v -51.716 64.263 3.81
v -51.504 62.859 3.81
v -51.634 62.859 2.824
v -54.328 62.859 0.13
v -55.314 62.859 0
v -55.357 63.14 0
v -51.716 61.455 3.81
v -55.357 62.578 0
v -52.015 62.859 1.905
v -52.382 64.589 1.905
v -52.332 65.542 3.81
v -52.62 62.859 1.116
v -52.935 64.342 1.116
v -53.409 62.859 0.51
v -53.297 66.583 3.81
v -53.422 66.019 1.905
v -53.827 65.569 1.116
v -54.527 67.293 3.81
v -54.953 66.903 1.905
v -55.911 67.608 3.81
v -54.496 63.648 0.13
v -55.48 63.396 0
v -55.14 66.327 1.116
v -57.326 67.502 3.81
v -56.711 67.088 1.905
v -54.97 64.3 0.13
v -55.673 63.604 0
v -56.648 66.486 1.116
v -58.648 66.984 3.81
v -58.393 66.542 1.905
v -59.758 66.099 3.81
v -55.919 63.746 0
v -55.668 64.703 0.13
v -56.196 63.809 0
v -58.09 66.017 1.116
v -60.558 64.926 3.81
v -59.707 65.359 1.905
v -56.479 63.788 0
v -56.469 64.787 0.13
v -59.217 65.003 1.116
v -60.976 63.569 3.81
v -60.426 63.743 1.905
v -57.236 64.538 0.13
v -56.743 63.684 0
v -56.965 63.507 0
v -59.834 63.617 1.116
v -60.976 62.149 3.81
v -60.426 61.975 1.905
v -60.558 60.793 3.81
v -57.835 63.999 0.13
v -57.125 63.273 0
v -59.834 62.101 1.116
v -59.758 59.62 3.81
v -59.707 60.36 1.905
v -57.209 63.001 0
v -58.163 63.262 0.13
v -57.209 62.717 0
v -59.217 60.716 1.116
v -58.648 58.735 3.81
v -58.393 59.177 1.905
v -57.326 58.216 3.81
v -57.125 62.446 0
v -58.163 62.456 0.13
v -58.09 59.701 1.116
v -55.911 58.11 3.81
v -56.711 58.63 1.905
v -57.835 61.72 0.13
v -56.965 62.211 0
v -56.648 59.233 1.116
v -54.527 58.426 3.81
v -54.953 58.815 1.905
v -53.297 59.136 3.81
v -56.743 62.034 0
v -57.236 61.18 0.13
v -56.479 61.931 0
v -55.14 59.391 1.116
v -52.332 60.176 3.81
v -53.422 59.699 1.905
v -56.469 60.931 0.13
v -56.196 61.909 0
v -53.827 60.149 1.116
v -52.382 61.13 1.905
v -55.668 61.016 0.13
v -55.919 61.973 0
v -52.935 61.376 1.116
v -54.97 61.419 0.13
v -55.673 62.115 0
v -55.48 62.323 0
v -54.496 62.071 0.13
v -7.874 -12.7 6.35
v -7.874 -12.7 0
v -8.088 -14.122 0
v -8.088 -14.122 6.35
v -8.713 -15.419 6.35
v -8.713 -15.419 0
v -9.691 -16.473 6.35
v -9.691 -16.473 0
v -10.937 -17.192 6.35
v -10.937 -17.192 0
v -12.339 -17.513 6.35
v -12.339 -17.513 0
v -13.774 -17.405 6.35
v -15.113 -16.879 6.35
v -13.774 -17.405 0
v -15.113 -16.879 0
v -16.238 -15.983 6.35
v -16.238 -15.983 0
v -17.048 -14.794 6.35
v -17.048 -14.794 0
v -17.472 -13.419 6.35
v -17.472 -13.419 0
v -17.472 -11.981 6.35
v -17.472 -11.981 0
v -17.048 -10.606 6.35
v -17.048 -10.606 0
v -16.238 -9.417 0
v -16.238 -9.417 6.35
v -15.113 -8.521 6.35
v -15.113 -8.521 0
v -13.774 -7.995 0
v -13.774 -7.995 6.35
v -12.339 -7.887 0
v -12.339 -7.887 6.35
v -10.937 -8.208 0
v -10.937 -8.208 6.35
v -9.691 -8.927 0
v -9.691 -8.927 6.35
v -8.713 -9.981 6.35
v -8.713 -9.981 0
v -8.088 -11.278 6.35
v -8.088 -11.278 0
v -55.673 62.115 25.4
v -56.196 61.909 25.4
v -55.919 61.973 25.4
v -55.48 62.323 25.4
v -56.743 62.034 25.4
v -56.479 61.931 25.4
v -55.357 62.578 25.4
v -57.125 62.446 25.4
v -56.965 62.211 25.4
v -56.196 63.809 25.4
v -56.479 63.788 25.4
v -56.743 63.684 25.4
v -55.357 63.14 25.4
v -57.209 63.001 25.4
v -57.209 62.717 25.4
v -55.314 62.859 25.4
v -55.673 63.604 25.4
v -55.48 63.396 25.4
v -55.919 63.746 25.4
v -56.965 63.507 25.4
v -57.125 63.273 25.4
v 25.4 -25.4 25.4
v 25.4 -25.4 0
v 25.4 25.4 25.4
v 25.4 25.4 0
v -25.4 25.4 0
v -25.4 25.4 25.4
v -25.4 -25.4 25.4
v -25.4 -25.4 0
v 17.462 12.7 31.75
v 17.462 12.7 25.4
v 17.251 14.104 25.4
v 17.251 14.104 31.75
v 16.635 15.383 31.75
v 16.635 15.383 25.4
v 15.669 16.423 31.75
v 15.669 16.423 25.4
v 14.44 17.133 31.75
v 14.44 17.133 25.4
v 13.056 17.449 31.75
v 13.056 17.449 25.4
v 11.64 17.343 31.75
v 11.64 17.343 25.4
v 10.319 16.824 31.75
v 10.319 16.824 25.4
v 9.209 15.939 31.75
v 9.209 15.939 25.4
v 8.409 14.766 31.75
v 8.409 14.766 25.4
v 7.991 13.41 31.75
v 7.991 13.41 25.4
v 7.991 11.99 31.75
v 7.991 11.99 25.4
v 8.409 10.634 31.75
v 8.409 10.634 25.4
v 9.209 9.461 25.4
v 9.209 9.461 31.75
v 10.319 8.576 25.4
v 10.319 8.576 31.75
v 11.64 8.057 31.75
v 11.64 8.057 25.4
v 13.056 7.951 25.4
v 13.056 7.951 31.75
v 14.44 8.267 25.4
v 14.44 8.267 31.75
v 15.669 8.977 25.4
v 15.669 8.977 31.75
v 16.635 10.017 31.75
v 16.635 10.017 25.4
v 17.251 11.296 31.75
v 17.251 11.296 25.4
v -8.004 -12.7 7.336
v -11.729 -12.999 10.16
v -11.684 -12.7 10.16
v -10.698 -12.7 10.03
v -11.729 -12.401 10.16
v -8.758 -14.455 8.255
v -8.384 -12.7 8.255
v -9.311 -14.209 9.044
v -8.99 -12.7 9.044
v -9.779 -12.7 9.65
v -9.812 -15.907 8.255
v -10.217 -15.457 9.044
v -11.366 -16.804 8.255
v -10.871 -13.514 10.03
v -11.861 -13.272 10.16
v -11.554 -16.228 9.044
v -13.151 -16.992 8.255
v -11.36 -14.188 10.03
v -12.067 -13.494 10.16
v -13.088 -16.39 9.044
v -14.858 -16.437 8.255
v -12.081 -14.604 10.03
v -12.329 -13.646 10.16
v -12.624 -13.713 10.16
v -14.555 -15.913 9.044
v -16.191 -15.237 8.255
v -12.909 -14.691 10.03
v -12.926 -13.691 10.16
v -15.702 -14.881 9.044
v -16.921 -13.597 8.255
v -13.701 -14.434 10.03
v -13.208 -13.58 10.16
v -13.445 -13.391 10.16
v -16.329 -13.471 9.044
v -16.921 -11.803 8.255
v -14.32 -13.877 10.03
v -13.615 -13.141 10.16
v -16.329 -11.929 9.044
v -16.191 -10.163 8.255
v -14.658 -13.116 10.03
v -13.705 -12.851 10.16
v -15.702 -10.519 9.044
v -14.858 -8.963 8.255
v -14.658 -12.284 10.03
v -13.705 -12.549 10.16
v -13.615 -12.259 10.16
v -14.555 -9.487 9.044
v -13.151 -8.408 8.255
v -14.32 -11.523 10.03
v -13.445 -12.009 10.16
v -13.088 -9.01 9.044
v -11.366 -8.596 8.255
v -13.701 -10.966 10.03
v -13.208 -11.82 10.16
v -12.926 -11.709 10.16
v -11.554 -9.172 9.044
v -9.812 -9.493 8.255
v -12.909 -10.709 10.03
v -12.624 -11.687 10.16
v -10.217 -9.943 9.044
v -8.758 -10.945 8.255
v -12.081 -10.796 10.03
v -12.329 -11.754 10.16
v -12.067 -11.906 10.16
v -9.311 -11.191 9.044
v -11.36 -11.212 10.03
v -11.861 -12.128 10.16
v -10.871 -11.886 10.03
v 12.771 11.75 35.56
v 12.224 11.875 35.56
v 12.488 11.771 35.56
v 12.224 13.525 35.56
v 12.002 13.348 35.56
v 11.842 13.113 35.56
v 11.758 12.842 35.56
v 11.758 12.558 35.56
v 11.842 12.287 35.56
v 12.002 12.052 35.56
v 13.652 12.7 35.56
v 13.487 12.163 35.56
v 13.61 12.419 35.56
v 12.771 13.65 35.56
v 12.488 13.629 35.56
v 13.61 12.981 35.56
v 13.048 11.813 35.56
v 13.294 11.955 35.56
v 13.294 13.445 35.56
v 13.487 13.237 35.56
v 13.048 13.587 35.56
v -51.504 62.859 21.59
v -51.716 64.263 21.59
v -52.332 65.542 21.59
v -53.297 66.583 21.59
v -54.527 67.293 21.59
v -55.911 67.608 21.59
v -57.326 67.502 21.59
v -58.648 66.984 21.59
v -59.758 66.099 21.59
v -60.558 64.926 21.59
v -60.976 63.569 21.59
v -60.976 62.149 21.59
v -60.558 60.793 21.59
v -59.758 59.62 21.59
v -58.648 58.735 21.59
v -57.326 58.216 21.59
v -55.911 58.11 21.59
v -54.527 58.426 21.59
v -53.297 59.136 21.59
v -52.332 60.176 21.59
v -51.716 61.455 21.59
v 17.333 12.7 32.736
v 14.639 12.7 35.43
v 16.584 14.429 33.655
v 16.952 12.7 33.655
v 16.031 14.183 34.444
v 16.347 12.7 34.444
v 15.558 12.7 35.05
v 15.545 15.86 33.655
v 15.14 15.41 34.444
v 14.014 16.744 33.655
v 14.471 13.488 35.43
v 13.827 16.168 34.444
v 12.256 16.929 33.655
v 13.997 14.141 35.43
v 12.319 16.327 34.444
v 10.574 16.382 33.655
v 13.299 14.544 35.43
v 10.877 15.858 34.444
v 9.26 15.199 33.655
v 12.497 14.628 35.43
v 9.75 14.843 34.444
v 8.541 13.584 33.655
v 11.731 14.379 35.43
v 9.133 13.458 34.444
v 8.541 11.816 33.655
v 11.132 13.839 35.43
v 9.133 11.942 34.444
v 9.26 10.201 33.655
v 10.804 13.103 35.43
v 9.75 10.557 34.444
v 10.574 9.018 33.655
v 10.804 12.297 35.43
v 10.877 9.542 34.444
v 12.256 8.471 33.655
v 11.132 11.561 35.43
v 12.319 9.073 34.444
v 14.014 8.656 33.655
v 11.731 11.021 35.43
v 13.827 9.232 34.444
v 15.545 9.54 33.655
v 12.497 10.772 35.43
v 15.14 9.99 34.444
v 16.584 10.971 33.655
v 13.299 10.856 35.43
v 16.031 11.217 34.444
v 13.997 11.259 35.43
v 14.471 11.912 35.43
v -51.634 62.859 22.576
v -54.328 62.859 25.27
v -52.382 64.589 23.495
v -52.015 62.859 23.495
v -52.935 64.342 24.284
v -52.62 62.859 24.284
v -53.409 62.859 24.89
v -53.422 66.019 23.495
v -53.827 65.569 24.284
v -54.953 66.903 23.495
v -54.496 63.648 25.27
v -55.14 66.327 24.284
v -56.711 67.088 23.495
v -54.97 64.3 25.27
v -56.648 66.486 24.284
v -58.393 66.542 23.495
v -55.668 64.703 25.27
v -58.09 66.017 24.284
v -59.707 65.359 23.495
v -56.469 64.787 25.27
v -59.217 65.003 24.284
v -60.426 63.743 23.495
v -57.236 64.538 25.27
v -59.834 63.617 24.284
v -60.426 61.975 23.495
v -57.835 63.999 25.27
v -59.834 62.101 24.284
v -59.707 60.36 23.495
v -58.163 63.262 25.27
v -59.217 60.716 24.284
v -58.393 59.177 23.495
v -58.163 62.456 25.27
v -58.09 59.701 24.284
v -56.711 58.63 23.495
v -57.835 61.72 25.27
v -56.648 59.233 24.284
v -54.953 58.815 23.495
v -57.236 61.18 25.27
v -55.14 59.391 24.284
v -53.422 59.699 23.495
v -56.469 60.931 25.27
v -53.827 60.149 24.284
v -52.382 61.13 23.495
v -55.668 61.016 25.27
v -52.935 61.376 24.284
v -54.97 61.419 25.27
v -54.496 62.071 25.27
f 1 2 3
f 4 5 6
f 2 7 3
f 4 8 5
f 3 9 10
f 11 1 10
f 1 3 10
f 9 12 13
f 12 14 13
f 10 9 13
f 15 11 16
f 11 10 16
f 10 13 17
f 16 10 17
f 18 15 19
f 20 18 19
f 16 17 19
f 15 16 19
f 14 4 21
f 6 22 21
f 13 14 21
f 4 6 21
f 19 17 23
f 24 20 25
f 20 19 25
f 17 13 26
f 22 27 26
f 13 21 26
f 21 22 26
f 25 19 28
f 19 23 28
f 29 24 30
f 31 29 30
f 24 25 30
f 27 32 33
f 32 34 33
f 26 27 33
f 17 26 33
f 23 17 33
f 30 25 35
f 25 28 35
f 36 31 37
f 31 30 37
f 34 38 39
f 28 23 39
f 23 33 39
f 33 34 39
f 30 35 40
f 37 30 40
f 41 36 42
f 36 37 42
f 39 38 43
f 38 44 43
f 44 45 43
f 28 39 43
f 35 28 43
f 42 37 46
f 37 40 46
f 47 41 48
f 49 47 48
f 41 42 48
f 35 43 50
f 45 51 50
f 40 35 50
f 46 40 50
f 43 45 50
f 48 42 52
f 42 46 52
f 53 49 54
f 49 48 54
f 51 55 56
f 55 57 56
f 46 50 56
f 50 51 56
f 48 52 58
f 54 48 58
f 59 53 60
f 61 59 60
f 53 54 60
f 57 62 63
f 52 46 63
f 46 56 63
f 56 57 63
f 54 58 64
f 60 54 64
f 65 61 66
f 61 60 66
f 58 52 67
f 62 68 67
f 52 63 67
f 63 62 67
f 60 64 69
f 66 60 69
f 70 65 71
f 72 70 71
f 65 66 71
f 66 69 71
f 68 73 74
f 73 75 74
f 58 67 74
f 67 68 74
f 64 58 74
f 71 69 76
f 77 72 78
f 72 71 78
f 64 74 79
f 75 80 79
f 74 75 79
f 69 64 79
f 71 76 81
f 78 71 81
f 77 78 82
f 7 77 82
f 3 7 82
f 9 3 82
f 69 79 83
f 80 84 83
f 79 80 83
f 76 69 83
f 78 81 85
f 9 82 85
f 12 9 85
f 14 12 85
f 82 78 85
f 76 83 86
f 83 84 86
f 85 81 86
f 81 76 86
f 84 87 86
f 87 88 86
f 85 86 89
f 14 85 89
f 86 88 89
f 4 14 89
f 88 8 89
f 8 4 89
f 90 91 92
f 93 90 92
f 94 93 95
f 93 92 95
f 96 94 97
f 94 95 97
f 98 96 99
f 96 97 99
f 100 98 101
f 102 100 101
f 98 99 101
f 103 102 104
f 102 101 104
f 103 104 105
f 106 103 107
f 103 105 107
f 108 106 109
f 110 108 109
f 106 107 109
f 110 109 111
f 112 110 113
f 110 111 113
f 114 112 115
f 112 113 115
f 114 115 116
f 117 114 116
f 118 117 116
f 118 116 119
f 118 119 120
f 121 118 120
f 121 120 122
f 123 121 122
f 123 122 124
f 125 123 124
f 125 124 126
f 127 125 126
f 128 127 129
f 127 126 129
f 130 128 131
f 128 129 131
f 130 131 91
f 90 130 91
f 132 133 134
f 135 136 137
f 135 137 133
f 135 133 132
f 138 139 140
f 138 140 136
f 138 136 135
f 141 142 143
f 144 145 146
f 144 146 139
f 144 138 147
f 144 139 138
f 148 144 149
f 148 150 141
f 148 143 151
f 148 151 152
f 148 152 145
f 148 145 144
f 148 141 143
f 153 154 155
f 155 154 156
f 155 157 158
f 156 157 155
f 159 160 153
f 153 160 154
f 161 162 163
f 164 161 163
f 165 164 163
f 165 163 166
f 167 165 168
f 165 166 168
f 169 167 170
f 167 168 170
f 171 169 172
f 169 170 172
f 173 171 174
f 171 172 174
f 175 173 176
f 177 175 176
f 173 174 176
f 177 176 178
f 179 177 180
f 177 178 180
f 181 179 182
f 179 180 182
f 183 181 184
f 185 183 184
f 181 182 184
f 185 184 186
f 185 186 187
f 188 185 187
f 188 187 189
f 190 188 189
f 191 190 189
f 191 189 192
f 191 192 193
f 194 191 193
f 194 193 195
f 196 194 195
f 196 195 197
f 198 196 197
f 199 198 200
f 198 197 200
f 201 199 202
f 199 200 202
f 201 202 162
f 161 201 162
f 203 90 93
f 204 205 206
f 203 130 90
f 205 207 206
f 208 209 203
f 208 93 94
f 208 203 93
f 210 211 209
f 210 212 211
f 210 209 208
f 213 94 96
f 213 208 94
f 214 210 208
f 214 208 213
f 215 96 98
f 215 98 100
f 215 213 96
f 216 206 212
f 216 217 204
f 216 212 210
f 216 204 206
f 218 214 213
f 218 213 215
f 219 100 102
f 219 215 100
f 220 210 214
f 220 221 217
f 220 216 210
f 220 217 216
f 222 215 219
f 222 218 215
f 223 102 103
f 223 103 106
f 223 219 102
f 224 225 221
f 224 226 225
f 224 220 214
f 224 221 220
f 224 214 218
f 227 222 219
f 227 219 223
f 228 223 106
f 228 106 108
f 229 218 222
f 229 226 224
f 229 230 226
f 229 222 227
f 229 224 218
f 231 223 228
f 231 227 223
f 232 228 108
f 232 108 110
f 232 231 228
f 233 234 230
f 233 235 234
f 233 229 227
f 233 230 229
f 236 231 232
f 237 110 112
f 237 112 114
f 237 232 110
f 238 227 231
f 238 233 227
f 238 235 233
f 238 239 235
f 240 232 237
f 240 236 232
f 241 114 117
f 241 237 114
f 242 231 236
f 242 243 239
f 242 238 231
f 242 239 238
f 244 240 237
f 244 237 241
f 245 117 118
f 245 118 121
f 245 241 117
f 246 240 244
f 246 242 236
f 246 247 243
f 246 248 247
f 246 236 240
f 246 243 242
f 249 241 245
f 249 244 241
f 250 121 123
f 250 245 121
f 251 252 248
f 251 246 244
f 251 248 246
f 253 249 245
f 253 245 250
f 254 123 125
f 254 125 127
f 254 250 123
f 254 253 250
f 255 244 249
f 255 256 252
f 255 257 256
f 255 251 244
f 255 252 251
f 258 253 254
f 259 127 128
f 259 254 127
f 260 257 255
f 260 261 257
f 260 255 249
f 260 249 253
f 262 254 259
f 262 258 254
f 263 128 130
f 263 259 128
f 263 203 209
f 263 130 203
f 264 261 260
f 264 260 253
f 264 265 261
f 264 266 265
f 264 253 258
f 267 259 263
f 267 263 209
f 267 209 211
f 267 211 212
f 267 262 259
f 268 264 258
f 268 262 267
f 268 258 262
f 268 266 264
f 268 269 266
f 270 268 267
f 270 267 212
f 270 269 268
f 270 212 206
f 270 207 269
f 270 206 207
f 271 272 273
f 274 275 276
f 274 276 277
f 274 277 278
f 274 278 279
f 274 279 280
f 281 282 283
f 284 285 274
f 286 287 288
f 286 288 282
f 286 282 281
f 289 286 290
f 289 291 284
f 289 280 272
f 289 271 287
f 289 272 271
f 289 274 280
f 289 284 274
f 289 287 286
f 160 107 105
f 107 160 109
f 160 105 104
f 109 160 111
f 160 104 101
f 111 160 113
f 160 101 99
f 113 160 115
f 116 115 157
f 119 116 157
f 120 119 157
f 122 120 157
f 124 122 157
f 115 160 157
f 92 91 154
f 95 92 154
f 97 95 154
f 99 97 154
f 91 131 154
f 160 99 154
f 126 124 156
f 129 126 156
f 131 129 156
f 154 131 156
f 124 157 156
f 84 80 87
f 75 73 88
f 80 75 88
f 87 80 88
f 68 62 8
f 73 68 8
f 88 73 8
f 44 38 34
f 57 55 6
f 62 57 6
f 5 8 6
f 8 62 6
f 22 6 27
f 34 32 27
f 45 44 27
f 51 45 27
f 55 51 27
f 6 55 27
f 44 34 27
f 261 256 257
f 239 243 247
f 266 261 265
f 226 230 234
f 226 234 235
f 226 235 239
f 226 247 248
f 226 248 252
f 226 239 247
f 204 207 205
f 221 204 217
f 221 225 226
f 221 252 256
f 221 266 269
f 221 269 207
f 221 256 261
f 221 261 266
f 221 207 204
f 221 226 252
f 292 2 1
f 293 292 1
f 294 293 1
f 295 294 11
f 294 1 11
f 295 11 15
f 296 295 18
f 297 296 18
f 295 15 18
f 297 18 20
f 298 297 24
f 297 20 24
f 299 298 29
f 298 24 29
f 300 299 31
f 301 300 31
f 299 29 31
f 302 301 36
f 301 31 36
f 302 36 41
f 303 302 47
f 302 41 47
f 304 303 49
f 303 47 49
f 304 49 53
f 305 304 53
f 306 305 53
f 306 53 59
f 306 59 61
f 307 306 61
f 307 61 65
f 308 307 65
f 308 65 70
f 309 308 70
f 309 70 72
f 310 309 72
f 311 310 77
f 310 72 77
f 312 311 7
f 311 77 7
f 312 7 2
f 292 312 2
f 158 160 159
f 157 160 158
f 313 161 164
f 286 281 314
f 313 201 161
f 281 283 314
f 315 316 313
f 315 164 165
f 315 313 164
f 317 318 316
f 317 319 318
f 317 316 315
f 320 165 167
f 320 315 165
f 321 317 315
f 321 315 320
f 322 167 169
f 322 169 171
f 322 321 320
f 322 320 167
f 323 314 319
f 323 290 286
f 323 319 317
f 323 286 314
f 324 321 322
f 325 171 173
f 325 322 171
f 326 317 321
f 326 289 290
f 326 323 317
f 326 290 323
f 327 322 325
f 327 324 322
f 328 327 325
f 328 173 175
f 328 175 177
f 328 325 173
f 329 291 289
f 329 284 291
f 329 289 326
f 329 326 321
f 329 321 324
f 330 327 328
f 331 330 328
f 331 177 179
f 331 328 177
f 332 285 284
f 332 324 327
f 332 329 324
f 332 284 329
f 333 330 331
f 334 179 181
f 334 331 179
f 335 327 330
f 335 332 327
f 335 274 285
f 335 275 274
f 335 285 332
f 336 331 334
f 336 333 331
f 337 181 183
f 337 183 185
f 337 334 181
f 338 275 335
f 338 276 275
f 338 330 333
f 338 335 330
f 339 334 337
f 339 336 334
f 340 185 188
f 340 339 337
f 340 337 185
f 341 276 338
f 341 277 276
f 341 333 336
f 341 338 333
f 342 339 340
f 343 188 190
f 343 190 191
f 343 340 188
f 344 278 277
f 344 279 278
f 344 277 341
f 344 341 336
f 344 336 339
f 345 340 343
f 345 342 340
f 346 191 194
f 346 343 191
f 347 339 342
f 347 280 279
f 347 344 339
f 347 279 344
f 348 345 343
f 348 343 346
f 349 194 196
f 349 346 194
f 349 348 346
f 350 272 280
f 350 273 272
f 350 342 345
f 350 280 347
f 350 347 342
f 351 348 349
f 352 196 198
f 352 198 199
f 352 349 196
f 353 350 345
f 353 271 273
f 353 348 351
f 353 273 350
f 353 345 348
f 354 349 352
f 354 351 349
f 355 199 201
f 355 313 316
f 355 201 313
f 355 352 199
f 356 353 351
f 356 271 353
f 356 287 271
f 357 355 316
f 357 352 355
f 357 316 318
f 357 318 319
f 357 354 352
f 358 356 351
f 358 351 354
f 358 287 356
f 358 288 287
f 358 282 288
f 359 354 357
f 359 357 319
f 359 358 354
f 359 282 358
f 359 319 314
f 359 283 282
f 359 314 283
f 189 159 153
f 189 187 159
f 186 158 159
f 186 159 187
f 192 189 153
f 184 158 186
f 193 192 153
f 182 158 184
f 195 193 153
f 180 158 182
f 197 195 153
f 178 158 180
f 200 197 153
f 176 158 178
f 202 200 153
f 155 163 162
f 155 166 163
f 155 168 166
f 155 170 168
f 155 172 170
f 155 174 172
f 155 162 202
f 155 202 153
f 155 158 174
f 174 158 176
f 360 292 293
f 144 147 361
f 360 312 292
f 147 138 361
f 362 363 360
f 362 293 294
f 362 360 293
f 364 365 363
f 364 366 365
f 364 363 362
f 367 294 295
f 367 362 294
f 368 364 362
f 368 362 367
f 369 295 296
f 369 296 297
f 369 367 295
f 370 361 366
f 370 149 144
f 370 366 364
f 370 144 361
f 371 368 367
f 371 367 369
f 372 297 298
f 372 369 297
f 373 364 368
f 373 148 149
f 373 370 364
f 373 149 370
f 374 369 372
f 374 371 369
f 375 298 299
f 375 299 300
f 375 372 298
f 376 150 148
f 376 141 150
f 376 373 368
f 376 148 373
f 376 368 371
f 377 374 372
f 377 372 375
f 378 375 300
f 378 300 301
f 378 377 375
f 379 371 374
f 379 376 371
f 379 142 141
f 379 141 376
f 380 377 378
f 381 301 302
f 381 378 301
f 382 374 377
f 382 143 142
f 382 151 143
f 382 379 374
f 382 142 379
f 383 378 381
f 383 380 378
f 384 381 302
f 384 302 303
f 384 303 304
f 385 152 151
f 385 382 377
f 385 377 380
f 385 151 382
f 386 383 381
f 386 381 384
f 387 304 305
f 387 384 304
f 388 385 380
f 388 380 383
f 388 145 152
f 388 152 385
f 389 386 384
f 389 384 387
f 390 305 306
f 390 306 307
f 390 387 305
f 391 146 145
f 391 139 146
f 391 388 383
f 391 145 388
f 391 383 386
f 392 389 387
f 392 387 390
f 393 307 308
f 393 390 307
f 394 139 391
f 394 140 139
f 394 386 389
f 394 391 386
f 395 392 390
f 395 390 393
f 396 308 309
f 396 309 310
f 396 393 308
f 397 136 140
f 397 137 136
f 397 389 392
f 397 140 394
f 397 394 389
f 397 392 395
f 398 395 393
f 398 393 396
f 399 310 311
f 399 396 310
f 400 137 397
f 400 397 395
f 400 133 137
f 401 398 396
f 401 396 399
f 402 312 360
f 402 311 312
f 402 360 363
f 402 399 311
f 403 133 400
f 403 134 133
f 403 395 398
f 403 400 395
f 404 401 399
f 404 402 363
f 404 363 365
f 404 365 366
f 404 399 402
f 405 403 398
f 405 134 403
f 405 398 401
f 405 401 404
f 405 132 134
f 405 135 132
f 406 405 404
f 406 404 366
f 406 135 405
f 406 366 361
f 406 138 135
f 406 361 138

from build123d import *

# Parameters (mm, degrees)
F0_W     = 50.8
F0_H     = 50.8
F1_DEPTH = 25.4
F2_R     = 4.7625
F3_DEPTH = 10.16
F4_R     = 3.81
F5_R     = 4.826
F6_DEPTH = 10.16
F7_R     = 3.81
F8_R     = 4.7625
F9_DEPTH = 25.4
F10_R    = 3.81


with BuildPart() as f1:
    # F0 (on Top) → F1 (new body)
    with BuildSketch(Plane.XY):
        Rectangle(F0_W, F0_H)
    extrude(amount=F1_DEPTH)

    # F2 (on face) → F3 (join)
    with BuildSketch(Plane.XY.offset(25.4)):
        with Locations((12.7, 12.7)):
            Circle(F2_R)
    extrude(amount=F3_DEPTH)

    # F4
    f4_edges = [f1.edges().sort_by_distance(p)[0] for p in [
        (7.9375, 12.7, 35.56),
    ]]
    fillet(f4_edges, radius=F4_R)

    # F5 (on face) → F6 (cut)
    with BuildSketch(Plane(origin=(0, 0, 0), x_dir=(1, 0, 0), z_dir=(0, 0, -1))):
        with Locations((-12.7, 12.7)):
            Circle(F5_R)
    extrude(amount=-F6_DEPTH, mode=Mode.SUBTRACT)

    # F7
    f7_edges = [f1.edges().sort_by_distance(p)[0] for p in [
        (-17.526, -12.7, 10.16),
    ]]
    fillet(f7_edges, radius=F7_R)


with BuildPart() as f9:
    # F8 (on Top) → F9 (new body)
    with BuildSketch(Plane.XY):
        with Locations((-56.266706, 62.85923)):
            Circle(F8_R)
    extrude(amount=F9_DEPTH)

    # F10
    f10_edges = [f9.edges().sort_by_distance(p)[0] for p in [
        (-61.029206, 62.85923, 25.4),
        (-61.029206, 62.85923, 0),
    ]]
    fillet(f10_edges, radius=F10_R)


solid = Compound([f1.part, f9.part])
